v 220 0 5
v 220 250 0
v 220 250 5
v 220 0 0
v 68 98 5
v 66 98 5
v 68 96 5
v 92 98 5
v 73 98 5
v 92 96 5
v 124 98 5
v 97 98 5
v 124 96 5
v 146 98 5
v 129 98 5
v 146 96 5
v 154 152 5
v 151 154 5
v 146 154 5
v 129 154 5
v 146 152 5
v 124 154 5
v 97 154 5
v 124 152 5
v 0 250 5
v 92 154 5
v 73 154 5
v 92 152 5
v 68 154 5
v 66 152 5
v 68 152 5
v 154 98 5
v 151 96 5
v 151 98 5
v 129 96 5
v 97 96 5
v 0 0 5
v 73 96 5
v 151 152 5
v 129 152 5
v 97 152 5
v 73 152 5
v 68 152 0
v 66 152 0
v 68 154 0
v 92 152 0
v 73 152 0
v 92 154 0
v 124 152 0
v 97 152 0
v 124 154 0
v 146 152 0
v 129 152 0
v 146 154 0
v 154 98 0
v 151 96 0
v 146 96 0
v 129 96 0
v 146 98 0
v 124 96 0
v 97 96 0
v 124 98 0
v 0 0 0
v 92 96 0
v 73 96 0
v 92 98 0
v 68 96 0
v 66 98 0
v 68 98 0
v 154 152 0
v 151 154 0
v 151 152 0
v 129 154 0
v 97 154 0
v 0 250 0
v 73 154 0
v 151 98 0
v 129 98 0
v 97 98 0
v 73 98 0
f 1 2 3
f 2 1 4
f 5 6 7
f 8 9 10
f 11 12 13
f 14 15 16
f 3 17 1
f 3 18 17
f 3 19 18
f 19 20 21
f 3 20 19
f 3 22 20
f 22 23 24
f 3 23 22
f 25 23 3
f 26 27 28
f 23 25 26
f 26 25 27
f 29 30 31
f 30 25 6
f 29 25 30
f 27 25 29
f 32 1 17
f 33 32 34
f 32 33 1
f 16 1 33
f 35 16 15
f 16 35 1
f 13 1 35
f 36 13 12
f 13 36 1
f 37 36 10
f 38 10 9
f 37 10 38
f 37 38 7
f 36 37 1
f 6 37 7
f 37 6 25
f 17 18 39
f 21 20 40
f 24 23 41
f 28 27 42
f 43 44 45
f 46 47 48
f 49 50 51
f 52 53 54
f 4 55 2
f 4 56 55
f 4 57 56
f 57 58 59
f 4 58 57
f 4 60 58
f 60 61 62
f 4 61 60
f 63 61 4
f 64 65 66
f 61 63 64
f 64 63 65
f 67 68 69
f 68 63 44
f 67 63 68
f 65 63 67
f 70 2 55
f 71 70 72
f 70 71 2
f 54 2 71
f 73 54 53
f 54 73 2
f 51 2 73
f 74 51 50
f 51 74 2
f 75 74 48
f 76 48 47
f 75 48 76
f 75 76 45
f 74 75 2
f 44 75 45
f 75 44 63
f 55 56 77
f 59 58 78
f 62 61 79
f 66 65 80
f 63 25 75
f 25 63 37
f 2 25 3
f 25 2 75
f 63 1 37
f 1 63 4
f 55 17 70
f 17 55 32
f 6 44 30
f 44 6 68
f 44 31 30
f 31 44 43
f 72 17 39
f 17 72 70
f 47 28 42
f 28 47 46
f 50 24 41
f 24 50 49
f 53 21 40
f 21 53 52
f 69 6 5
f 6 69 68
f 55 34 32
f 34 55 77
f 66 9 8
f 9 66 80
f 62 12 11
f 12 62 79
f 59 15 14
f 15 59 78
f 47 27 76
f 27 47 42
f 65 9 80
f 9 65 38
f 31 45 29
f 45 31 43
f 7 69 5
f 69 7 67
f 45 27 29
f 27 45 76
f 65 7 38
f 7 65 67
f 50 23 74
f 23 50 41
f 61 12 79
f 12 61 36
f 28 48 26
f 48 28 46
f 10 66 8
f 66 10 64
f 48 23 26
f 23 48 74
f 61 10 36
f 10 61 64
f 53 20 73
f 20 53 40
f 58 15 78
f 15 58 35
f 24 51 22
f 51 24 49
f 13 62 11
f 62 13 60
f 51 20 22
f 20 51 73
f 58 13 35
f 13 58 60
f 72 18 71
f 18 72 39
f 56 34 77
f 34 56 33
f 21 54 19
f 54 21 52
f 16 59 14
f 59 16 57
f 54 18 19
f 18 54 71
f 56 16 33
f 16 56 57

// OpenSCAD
/*

Test surround for Camloc 400
@idnorton
2023-08-17

Licenced as Creative Commons Attribution Non Commercial 3.0
See https://creativecommons.org/licenses/by-nc/3.0/

Specifically you may not sell the design or products using the design.
You're welcome to use the design to build things for your own commercial event

*/

lock_x = 88;
lock_y = 54;
lock_z = 5;

//lock_x_border = (110 - lock_x) / 2;
//lock_y_border = (80 - lock_y) / 2;

lock_x_border = (220 - lock_x) / 2;
lock_y_border = (250 - lock_y) / 2;

tab_x = 5;
tab_y = 2;

difference() {
    // Outside border
    cube([lock_x + (lock_x_border*2), lock_y + (lock_y_border * 2), lock_z], center = false);

    // Main body of lock
    translate([lock_x_border, lock_y_border, 0]) {
        cube([lock_x, lock_y, lock_z], center = false);
    }

    // Tabs vertical left most
    translate([lock_x_border + 2, lock_y_border - tab_y, 0]) {
        cube([tab_x, lock_y + (2*tab_y), lock_z], center = false);
    }

    // Tabs vertical left center
    translate([lock_x_border + 26, lock_y_border - tab_y, 0]) {
        cube([tab_x, lock_y + (2*tab_y), lock_z], center = false);
    }

    // Tabs vertical right center
    translate([lock_x_border + 58, lock_y_border - tab_y, 0]) {
        cube([tab_x, lock_y + (2*tab_y), lock_z], center = false);
    }

    // Tabs vertical right most
    translate([lock_x_border + 80, lock_y_border - tab_y, 0]) {
        cube([tab_x, lock_y + (2*tab_y), lock_z], center = false);
    }
}
